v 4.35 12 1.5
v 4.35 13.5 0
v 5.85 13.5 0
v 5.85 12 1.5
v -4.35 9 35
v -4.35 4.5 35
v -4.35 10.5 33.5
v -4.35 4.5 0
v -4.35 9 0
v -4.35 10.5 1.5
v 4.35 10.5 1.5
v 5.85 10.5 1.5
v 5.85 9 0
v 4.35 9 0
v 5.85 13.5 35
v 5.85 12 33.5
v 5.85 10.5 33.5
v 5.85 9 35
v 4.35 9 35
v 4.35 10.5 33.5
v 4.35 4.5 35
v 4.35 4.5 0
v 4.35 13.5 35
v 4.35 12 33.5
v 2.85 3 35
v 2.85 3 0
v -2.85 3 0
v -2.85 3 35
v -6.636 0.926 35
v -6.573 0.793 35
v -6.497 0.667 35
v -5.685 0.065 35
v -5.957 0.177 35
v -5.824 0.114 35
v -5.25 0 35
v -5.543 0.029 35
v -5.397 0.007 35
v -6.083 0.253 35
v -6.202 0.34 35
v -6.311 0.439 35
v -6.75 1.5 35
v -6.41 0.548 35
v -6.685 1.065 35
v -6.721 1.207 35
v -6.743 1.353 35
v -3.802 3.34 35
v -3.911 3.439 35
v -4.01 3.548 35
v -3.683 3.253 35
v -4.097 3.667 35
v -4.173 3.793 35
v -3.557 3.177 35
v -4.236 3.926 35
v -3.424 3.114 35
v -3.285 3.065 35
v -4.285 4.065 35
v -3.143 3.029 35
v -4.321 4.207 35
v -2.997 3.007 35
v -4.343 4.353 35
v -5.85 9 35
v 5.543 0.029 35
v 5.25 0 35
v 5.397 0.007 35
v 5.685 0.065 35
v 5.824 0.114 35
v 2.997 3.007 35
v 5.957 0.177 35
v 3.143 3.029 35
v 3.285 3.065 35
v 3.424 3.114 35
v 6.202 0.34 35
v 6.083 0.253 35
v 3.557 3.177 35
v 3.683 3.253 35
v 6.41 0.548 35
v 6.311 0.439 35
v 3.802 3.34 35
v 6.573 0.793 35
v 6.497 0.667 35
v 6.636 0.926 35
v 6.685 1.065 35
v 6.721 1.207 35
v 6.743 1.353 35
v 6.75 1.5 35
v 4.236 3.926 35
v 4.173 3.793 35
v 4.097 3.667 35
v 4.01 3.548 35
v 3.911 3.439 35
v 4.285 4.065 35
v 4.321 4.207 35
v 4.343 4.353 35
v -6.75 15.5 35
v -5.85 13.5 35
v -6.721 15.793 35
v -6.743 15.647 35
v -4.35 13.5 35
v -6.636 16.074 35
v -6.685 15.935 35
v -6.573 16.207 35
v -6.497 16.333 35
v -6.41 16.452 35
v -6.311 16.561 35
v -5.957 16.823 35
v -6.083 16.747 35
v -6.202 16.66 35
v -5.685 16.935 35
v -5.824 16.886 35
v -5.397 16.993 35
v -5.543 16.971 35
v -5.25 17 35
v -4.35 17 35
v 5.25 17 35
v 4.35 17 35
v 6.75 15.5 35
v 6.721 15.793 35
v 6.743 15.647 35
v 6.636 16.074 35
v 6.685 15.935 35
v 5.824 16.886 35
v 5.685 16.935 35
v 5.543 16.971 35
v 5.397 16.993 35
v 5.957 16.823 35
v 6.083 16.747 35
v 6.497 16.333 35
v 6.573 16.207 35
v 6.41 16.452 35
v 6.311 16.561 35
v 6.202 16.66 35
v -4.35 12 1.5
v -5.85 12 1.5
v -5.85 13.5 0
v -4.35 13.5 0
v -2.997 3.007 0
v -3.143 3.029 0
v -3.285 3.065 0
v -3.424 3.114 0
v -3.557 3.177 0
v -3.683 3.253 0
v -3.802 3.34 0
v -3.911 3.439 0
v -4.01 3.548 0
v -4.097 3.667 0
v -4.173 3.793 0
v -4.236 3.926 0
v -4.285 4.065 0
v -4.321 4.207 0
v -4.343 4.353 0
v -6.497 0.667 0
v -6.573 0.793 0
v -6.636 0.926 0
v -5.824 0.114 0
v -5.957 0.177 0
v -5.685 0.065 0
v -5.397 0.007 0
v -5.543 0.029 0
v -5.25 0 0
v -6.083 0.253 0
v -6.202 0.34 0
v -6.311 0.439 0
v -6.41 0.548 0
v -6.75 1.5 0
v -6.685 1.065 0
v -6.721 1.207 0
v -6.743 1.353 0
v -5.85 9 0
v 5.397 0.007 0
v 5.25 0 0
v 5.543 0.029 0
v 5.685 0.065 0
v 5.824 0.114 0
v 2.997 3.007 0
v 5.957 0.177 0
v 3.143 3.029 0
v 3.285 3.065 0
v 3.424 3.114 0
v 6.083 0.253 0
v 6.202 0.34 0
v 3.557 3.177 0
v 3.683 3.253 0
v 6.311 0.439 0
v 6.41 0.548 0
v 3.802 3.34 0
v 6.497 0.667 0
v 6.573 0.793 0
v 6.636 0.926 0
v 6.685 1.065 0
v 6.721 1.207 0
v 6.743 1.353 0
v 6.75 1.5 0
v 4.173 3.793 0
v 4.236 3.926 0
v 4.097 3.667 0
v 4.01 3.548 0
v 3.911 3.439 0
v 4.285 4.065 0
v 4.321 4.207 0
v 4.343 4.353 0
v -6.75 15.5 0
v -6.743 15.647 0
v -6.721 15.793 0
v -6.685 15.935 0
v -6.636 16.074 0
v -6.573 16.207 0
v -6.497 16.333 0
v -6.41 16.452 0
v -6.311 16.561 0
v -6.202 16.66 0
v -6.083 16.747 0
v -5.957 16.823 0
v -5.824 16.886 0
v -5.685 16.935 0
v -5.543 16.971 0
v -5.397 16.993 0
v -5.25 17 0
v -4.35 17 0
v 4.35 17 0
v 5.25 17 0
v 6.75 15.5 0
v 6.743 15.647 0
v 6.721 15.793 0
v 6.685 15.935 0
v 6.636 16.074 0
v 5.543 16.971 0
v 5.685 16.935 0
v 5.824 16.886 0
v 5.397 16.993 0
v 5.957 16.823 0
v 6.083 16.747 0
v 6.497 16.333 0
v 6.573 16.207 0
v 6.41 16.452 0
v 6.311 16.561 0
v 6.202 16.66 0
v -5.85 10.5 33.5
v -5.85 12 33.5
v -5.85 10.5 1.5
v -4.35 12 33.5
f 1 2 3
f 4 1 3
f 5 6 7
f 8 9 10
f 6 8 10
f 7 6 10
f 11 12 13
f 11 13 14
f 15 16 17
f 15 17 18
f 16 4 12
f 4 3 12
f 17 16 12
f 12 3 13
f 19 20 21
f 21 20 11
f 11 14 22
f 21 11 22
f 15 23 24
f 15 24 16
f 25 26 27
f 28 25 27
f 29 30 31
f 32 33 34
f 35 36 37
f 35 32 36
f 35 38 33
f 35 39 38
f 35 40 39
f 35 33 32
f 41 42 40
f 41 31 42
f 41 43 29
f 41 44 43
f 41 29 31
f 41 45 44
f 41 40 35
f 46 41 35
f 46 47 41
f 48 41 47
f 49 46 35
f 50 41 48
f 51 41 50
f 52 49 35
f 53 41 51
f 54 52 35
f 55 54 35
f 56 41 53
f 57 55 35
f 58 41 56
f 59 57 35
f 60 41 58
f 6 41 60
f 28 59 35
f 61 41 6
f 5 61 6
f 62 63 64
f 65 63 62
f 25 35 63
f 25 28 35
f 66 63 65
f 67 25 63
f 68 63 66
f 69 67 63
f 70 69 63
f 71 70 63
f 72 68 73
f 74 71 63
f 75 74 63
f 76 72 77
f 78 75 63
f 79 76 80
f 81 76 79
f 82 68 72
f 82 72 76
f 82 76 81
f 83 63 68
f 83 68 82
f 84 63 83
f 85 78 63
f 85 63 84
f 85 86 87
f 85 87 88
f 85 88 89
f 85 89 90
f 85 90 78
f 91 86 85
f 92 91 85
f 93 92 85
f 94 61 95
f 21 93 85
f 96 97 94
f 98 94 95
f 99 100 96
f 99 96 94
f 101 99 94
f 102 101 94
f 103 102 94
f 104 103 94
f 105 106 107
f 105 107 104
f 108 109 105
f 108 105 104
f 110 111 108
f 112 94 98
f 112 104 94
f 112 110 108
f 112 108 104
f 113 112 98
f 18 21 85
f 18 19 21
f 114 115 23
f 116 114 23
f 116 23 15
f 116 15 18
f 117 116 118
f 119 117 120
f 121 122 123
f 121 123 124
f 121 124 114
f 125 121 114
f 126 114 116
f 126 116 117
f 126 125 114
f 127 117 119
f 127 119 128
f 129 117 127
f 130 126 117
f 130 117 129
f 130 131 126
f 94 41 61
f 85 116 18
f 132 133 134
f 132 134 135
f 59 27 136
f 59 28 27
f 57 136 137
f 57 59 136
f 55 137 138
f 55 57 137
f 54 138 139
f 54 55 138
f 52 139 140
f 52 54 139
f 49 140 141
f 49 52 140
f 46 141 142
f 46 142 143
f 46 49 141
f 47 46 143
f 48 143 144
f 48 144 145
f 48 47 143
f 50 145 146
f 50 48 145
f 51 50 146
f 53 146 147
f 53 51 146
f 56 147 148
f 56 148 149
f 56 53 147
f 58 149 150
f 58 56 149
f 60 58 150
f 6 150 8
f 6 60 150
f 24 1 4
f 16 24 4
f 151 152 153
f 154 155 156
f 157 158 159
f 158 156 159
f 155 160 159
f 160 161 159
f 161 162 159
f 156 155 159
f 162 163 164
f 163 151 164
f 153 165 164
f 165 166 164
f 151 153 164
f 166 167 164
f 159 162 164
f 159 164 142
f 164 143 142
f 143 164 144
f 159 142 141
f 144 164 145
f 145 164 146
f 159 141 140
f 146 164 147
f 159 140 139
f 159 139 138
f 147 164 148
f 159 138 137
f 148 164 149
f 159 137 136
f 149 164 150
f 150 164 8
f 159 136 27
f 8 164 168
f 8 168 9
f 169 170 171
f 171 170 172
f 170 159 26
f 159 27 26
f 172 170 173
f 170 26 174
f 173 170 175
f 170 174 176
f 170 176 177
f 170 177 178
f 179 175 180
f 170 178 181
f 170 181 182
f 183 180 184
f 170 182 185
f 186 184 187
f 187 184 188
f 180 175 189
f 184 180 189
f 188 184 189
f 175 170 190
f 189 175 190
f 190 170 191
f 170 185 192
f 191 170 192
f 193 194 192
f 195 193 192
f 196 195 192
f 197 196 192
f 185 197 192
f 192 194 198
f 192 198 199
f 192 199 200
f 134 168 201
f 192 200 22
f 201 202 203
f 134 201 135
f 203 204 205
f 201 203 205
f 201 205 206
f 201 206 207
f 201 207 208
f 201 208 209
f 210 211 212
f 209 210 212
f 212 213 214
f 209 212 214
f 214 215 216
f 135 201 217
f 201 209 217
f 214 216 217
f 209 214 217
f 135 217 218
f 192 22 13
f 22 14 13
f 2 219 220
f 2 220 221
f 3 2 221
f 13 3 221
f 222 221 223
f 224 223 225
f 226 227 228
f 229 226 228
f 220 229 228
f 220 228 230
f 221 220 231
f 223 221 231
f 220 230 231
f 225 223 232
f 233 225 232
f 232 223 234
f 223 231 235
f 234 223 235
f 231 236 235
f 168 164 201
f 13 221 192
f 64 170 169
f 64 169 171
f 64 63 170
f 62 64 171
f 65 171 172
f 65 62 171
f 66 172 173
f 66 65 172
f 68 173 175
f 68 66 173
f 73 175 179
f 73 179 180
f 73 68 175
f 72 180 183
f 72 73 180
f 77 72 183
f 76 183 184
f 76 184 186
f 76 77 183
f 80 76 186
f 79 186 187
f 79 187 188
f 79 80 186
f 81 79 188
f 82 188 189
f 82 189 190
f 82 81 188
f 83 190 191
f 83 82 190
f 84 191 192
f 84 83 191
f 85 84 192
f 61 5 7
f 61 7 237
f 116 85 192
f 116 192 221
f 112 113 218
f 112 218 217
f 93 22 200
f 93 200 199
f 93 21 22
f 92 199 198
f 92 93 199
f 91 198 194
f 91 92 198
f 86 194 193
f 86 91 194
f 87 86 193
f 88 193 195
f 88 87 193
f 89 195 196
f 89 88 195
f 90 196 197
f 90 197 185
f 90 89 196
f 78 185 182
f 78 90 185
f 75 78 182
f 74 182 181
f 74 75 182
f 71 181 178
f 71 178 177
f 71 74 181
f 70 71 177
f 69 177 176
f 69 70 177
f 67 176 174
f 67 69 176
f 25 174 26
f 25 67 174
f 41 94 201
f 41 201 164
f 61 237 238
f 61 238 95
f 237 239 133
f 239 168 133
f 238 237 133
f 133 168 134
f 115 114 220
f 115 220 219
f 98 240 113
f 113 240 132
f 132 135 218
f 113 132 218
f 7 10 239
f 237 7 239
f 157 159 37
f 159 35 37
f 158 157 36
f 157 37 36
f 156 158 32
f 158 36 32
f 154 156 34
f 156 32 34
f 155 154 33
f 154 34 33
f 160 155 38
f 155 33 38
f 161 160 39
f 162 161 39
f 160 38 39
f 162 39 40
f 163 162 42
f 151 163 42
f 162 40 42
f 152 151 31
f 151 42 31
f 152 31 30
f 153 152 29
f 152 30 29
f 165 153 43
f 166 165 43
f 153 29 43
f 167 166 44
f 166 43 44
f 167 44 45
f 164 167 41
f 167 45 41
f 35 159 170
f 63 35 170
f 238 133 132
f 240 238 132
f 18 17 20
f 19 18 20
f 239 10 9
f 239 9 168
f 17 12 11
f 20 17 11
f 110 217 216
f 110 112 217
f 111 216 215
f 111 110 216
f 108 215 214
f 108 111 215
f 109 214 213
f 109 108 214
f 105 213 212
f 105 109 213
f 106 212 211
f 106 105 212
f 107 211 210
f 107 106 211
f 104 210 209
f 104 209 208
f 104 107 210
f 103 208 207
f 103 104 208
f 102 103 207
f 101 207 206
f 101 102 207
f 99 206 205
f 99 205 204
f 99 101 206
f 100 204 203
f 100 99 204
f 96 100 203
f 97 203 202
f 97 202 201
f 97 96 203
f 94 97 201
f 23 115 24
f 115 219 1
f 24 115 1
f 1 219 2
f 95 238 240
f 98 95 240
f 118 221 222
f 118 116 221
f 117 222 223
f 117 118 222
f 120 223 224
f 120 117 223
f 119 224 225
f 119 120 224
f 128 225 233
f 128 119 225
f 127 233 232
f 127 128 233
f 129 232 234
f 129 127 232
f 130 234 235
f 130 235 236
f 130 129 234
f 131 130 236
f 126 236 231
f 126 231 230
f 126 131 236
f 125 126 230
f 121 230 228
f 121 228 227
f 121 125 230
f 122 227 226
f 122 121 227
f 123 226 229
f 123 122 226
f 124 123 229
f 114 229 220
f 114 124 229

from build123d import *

# Parameters (mm, degrees)
AUFSATZ_LINEAR_AUSTRAGEN1_DEPTH = 35
VERRUNDUNG1_R                   = 1.5
FASE1_SIZE                      = 1.5


with BuildPart() as part:
    # Skizze1 → Aufsatz-Linear austragen1 (new body)
    with BuildSketch(Plane.XY):
        Polygon((-6.75, 0), (6.75, 0), (6.75, 17), (4.35, 17), (4.35, 12), (5.85, 12), (5.85, 10.5), (4.35, 10.5), (4.35, 3), (-4.35, 3), (-4.35, 10.5), (-5.85, 10.5), (-5.85, 12), (-4.35, 12), (-4.35, 17), (-6.75, 17), align=None)
    extrude(amount=AUFSATZ_LINEAR_AUSTRAGEN1_DEPTH)

    # Verrundung1
    verrundung1_edges = [part.edges().sort_by_distance(p)[0] for p in [
        (6.75, 0, 17.5),
        (-6.75, 0, 17.5),
        (-6.75, 17, 17.5),
        (-4.35, 3, 17.5),
        (4.35, 3, 17.5),
        (6.75, 17, 17.5),
    ]]
    fillet(verrundung1_edges, radius=VERRUNDUNG1_R)

    # Fase1
    fase1_edges = [part.edges().sort_by_distance(p)[0] for p in [
        (5.1, 12, 35),
        (-5.1, 12, 0),
        (-5.1, 10.5, 0),
        (5.1, 10.5, 0),
        (5.1, 12, 0),
        (5.1, 10.5, 35),
        (-5.1, 10.5, 35),
        (-5.1, 12, 35),
    ]]
    chamfer(fase1_edges, length=FASE1_SIZE)


solid = part.part
